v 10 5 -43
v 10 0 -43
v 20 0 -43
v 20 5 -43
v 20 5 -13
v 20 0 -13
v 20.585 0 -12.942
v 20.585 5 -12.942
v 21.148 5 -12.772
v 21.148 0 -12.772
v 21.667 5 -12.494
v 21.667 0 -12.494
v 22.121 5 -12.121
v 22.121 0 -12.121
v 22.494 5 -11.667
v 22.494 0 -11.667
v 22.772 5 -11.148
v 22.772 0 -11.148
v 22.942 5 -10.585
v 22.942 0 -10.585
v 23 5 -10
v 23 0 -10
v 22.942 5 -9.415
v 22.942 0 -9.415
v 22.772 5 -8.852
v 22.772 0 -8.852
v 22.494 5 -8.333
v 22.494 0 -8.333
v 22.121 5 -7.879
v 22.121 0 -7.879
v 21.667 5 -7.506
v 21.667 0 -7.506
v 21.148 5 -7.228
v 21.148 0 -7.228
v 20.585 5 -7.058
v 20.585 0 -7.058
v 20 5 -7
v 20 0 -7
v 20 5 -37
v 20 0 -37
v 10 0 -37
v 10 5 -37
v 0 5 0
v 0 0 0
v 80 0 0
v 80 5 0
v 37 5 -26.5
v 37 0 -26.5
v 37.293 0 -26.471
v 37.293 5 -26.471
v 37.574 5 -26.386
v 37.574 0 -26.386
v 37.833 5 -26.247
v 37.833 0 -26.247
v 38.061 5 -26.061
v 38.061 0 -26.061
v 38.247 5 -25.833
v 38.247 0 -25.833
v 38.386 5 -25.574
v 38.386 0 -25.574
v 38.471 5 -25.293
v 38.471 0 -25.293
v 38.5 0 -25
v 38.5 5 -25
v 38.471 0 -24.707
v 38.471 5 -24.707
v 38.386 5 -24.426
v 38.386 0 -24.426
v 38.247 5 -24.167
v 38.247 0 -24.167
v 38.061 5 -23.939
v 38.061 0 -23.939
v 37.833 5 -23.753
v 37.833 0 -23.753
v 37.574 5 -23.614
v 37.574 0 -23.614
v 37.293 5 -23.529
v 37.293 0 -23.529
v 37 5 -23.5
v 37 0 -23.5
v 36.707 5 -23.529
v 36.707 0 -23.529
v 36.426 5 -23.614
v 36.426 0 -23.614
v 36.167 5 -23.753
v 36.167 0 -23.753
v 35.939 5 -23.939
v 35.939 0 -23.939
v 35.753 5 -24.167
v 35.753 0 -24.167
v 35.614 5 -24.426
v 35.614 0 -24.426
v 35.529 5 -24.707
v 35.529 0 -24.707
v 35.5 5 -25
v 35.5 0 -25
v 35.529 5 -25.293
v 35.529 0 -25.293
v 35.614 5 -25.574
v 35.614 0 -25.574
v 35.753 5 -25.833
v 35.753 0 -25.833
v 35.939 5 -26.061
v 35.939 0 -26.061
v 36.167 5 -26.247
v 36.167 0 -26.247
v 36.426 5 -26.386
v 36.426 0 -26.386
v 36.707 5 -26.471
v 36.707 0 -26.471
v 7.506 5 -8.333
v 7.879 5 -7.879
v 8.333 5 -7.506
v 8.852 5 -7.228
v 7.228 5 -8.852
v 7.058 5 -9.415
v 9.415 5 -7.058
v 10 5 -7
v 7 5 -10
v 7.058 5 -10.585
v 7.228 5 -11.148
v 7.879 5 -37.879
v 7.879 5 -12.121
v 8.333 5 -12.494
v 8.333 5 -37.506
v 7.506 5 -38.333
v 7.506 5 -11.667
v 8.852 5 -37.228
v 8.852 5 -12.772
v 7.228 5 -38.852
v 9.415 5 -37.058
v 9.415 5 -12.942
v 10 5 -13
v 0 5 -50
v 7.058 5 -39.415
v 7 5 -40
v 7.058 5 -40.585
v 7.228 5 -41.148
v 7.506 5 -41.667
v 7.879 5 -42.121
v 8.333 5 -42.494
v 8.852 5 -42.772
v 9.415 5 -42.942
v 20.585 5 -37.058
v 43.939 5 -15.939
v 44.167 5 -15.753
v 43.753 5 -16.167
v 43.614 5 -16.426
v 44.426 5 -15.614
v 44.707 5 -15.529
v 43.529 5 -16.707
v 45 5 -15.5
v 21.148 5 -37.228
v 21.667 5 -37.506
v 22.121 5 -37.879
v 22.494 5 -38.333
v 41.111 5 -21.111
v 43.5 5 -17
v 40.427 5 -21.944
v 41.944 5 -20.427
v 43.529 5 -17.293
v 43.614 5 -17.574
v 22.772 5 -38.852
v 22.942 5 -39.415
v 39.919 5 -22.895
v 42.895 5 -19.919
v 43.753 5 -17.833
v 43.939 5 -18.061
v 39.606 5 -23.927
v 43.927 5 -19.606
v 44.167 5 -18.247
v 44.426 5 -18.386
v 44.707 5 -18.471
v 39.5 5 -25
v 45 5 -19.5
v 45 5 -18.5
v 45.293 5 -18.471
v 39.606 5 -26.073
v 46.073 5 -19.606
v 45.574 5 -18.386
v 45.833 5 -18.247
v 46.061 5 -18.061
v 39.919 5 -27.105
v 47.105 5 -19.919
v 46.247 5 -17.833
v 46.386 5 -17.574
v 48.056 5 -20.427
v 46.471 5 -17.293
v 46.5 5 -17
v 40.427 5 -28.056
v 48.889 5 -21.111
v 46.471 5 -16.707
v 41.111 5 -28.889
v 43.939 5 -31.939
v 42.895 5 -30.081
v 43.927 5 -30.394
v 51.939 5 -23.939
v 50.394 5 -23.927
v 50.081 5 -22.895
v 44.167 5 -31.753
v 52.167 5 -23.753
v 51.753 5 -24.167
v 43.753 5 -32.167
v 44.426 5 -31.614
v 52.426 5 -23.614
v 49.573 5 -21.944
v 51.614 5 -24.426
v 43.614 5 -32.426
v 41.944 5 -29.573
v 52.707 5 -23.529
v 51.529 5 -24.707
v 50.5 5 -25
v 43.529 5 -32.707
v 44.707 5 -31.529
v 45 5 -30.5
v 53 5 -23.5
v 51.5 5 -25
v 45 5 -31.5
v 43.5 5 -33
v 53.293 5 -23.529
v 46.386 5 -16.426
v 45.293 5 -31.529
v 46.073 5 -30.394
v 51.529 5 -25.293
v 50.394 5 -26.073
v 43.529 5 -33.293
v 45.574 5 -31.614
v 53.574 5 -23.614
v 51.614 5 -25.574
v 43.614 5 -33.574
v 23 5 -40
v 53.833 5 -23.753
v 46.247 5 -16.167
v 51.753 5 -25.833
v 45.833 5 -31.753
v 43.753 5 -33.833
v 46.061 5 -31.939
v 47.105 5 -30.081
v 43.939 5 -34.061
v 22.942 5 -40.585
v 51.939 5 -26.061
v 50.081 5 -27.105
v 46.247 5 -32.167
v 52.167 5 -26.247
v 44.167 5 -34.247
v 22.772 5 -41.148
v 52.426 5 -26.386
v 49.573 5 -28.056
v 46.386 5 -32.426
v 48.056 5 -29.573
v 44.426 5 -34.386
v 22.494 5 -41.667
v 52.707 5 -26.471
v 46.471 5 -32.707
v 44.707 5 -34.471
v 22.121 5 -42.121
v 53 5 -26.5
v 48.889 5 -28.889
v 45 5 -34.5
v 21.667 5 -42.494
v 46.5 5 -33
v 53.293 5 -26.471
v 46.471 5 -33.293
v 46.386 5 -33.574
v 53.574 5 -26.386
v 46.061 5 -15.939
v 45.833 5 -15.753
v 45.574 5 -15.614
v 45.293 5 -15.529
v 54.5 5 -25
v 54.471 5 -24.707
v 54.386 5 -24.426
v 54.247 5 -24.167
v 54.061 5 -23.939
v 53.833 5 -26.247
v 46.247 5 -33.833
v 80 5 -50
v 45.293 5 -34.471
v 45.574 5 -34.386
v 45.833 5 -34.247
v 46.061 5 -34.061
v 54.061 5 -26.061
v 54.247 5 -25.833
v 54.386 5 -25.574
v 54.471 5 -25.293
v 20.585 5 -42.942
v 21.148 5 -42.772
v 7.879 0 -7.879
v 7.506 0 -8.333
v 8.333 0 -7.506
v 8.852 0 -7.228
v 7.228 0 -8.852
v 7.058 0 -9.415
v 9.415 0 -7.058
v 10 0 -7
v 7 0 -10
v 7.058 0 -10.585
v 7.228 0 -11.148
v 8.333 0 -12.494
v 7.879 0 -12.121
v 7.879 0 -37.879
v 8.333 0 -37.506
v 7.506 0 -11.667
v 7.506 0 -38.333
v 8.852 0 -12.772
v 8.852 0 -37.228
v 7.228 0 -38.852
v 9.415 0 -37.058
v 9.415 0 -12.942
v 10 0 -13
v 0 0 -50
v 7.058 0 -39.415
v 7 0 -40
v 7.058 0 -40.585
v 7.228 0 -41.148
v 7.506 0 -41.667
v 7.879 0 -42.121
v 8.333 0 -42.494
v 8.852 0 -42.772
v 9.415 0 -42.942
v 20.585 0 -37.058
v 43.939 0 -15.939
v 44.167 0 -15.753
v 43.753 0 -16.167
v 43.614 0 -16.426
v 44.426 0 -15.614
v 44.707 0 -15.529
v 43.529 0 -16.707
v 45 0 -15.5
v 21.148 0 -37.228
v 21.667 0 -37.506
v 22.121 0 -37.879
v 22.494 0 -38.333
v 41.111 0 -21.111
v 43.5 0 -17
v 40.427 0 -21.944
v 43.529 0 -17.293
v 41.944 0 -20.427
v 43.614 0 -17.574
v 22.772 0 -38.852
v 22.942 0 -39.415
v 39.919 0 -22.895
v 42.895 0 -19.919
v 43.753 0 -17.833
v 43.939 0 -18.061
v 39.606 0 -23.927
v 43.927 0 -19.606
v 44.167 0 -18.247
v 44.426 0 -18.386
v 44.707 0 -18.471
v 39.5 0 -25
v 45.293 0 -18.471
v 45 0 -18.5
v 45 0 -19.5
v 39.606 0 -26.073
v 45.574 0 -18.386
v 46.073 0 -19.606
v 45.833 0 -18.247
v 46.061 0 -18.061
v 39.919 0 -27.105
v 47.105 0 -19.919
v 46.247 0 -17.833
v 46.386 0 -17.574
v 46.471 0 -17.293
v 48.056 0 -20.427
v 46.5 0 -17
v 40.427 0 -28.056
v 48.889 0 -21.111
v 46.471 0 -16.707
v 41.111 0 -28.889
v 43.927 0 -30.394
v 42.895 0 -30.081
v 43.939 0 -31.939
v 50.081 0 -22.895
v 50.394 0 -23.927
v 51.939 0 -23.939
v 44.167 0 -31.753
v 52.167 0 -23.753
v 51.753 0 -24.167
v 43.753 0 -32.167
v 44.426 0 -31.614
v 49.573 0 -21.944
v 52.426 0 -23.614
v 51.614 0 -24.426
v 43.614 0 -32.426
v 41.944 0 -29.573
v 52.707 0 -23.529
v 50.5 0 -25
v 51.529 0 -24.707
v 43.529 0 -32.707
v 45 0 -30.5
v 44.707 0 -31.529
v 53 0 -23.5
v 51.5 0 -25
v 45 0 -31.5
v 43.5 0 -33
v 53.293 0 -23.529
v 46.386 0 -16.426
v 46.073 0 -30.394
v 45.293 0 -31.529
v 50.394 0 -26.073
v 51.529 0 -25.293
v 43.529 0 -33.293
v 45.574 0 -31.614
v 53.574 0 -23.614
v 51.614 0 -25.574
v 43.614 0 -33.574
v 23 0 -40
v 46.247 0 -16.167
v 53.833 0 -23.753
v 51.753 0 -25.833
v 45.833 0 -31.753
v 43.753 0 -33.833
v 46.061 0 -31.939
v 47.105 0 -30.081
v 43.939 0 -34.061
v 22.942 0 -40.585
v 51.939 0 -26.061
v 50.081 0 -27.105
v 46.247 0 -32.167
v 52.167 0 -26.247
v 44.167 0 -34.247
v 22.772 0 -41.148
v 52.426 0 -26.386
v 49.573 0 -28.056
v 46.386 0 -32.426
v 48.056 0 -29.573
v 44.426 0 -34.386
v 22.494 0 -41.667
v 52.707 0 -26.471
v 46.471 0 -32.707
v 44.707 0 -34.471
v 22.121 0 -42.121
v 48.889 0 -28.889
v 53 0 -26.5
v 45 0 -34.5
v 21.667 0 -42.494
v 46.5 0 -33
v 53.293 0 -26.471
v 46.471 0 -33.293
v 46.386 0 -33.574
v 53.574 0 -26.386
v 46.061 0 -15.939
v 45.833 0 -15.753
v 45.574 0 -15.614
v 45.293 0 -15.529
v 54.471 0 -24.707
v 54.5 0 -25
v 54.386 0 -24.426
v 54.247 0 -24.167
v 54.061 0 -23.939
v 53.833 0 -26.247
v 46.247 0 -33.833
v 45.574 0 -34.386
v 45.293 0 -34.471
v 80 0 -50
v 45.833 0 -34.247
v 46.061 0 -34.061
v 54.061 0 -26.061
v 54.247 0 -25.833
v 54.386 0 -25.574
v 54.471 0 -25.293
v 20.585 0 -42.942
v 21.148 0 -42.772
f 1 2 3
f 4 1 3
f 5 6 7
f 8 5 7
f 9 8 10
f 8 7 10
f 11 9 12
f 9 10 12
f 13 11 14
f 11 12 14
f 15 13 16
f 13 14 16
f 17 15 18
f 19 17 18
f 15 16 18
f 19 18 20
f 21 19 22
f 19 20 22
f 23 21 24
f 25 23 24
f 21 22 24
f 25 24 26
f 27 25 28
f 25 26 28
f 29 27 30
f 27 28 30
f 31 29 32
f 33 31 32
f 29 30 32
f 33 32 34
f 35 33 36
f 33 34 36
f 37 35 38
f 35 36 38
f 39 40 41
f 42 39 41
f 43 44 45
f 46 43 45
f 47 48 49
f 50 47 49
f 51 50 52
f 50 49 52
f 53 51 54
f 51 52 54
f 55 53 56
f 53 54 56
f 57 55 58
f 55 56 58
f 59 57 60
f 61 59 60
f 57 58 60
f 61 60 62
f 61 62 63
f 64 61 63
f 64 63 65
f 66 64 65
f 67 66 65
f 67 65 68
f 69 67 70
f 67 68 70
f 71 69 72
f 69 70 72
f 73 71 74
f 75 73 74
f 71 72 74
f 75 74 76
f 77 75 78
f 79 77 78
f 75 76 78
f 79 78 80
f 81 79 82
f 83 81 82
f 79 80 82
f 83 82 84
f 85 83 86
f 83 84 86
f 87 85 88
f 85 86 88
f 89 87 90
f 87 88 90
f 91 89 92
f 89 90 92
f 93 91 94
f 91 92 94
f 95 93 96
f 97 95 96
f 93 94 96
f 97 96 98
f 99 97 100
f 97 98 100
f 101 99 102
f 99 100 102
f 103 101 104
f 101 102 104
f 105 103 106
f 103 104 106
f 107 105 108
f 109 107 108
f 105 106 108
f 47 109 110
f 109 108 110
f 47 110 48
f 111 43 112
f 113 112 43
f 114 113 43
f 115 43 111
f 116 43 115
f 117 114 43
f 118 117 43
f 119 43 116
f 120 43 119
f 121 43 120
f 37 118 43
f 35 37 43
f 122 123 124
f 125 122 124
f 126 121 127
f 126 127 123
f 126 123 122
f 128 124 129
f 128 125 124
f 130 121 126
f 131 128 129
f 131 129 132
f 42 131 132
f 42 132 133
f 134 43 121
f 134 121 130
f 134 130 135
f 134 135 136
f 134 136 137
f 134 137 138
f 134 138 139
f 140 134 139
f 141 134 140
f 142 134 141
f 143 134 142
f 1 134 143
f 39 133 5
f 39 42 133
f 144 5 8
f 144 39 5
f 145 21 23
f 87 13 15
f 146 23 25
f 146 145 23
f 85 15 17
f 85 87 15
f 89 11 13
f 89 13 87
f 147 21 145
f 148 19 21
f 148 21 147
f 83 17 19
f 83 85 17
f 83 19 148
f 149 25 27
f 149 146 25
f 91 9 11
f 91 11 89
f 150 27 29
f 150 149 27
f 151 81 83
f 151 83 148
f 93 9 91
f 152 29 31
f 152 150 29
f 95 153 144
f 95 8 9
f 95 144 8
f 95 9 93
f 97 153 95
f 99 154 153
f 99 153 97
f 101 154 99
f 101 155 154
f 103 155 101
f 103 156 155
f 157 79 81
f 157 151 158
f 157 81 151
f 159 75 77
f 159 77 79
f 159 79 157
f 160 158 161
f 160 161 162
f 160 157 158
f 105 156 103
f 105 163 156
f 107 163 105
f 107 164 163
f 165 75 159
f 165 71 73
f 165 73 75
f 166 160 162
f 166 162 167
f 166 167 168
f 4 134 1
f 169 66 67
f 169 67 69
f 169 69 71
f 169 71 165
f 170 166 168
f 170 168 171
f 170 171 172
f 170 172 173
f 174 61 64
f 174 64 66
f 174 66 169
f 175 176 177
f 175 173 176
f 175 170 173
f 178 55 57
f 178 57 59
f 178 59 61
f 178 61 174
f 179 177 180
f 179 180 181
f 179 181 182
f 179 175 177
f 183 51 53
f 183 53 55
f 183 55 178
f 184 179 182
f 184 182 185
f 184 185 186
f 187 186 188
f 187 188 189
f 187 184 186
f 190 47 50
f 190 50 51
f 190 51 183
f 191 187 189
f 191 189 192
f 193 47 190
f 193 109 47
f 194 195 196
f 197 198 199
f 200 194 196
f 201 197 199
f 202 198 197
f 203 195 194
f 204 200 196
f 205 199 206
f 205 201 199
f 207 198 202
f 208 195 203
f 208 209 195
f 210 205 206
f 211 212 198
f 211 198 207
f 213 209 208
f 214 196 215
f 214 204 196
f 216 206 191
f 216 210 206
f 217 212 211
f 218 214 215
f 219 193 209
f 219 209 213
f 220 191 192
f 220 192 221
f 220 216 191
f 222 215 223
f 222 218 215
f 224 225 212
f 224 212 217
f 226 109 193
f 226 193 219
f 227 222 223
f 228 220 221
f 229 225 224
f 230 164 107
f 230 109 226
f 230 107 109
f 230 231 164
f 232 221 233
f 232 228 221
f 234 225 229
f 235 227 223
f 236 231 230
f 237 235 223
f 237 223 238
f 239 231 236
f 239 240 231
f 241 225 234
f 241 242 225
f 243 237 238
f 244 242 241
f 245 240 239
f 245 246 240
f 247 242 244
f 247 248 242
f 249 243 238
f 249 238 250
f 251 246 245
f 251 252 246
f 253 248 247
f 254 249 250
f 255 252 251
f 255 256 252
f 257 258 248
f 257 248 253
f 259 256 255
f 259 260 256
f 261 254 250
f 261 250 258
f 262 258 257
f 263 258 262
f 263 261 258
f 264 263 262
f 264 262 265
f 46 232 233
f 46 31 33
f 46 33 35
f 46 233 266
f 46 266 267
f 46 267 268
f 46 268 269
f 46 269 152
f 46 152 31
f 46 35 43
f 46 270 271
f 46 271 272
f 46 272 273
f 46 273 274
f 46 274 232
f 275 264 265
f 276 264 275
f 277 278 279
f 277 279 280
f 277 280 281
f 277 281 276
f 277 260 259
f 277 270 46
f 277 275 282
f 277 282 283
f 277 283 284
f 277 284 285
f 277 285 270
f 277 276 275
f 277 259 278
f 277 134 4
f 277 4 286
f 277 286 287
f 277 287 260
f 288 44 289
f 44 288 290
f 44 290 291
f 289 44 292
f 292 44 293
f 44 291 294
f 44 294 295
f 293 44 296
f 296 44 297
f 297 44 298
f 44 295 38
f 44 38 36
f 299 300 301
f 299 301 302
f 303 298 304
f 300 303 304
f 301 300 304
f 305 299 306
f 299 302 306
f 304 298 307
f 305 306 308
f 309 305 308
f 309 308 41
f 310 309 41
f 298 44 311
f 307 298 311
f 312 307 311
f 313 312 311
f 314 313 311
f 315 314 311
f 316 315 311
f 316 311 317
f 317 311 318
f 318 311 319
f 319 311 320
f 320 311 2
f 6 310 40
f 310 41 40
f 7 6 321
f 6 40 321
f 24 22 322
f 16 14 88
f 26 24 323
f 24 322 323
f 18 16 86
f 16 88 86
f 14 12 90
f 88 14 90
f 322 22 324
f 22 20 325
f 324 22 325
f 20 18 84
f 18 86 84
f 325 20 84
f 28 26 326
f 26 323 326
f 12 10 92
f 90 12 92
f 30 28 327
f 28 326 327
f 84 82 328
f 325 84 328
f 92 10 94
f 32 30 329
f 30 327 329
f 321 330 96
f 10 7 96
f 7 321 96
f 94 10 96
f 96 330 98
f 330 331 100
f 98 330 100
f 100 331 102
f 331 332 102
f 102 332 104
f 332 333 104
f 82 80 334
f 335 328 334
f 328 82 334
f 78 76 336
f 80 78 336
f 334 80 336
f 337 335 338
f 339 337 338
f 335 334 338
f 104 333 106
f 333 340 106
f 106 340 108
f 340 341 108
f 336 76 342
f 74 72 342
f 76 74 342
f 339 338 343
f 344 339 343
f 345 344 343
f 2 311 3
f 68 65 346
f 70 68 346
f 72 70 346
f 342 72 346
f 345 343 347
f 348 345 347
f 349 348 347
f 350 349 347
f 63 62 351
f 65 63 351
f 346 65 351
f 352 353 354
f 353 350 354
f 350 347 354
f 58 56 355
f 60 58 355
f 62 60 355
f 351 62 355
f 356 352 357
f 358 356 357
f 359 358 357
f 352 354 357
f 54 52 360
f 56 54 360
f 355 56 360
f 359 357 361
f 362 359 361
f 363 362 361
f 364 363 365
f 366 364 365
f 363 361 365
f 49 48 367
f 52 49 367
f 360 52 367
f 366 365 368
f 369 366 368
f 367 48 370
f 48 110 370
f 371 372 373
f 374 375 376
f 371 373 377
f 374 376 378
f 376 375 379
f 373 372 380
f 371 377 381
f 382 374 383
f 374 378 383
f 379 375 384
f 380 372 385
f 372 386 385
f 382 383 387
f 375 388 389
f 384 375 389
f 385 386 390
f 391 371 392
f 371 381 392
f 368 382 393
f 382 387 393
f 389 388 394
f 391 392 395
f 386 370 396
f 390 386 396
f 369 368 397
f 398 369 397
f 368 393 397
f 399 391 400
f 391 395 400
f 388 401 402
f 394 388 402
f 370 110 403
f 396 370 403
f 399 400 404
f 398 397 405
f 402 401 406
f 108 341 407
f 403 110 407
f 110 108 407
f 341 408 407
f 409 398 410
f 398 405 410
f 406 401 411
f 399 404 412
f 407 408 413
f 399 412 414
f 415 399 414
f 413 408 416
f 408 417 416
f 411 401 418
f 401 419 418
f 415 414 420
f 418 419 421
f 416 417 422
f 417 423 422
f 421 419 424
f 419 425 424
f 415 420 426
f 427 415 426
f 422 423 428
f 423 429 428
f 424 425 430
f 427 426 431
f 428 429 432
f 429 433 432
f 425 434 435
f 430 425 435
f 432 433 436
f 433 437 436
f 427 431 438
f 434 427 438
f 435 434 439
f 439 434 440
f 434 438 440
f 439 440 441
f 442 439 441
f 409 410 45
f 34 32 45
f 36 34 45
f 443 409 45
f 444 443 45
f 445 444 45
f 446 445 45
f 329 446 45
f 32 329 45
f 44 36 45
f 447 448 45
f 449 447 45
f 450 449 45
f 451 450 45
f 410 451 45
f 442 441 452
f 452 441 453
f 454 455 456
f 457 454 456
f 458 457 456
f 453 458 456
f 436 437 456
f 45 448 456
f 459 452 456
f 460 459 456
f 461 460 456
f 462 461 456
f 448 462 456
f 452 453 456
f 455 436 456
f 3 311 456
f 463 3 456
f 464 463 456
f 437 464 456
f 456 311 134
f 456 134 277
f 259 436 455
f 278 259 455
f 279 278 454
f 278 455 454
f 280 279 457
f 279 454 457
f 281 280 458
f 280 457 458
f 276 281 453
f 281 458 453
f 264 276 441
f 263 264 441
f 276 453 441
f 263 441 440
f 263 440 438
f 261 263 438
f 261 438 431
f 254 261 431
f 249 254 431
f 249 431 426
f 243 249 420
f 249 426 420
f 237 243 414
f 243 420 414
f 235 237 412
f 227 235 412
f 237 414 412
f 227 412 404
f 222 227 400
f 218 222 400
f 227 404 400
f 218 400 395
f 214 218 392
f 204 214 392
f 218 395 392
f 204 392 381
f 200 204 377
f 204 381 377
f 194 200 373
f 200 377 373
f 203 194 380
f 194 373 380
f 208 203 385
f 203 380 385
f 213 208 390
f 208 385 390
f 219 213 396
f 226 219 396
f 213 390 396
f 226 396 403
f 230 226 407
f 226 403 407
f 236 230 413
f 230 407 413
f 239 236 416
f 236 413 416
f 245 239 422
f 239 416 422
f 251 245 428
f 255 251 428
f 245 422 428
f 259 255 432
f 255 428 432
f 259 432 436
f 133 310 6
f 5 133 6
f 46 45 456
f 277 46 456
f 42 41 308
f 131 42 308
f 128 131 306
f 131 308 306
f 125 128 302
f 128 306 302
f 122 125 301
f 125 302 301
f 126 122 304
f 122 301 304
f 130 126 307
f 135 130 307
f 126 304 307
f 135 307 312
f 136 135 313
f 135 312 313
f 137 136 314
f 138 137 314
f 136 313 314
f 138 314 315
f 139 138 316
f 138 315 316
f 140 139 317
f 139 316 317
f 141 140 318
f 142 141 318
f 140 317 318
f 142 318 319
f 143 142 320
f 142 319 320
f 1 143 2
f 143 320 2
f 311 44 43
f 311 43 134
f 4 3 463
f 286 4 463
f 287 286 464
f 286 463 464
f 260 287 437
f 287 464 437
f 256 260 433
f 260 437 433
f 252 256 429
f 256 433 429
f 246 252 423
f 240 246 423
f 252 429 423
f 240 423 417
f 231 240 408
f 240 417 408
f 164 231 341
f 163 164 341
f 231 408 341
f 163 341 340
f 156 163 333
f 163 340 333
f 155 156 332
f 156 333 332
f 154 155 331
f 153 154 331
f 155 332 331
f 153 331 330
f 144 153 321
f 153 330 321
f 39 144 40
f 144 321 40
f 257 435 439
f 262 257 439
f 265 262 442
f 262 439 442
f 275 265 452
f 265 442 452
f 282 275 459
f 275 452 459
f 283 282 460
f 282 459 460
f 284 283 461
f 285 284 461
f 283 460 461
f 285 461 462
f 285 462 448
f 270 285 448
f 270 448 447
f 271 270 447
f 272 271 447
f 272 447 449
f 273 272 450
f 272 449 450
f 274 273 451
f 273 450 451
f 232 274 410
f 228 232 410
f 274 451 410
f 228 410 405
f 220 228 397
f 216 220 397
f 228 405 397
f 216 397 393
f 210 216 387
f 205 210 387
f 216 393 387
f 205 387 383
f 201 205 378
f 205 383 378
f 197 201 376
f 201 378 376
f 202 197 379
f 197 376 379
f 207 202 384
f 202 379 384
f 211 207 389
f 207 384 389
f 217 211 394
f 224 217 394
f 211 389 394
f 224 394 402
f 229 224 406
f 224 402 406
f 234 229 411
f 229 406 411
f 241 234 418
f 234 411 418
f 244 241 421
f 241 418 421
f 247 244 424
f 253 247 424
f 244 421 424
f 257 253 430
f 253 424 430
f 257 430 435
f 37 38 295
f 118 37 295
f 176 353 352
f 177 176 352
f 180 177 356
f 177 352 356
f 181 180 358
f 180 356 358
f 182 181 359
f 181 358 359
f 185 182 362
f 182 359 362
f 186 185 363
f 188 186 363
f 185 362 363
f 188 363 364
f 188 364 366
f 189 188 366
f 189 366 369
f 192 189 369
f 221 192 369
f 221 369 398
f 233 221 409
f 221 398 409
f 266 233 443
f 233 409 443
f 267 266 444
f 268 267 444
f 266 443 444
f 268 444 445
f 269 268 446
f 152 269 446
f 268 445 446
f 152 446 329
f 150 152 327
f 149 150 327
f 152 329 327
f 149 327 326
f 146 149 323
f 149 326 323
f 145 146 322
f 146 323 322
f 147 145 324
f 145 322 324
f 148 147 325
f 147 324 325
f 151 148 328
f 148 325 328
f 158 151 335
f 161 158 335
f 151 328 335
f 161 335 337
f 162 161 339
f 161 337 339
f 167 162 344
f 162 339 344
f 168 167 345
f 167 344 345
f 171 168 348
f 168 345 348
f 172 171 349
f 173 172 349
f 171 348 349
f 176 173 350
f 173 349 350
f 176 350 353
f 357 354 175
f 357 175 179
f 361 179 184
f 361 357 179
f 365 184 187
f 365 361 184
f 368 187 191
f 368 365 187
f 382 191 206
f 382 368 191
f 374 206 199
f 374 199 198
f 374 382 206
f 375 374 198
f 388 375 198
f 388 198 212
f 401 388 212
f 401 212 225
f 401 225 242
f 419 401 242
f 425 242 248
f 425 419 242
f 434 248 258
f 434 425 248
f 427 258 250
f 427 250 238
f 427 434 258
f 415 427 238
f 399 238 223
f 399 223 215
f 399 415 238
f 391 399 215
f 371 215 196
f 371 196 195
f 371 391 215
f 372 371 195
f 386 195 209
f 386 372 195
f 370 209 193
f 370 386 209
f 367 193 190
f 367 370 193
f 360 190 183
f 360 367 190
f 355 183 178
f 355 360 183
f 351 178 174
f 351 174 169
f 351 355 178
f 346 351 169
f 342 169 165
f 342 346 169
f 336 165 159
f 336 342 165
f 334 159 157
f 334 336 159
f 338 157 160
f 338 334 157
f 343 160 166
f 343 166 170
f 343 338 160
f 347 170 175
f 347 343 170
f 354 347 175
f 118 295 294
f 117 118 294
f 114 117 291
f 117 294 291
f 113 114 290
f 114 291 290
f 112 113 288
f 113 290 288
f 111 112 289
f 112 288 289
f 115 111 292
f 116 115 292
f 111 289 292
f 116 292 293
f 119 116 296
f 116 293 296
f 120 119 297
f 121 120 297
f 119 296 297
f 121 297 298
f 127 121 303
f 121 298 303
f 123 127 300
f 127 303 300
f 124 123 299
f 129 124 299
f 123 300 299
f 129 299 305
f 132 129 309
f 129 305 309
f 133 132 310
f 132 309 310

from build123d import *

# Parameters (mm, degrees)
SKETCH1_W           = 80
SKETCH1_H           = 50
SKETCH1_R           = 5.5
BOSS_EXTRUDE1_DEPTH = 5
SKETCH3_R           = 1.5
CUT_EXTRUDE1_DEPTH  = 5


with BuildPart() as part:
    # Sketch1 → Boss-Extrude1 (new body)
    with BuildSketch(Plane(origin=(0, 0, 0), x_dir=(1, 0, 0), z_dir=(0, 1, 0))):
        with Locations((40, 25)):
            Rectangle(SKETCH1_W, SKETCH1_H)
        with Locations(Location((45, 25, 0), (0, 0, 270))):
            Circle(SKETCH1_R, mode=Mode.SUBTRACT)
        with BuildLine():
            Line((10, 43), (20, 43))
            ThreePointArc((20, 43), (23, 40), (20, 37))
            Line((20, 37), (10, 37))
            ThreePointArc((10, 37), (7, 40), (10, 43))
        make_face(mode=Mode.SUBTRACT)
        with BuildLine():
            Line((10, 13), (20, 13))
            ThreePointArc((20, 13), (23, 10), (20, 7))
            Line((20, 7), (10, 7))
            ThreePointArc((10, 7), (7, 10), (10, 13))
        make_face(mode=Mode.SUBTRACT)
    extrude(amount=BOSS_EXTRUDE1_DEPTH)

    # Sketch3 → Cut-Extrude1 (cut)
    with BuildSketch(Plane.XZ):
        with Locations(Location((45, -17, 0), (0, 0, 270))):
            Circle(SKETCH3_R)
        with Locations(Location((53, -25, 0), (0, 0, 270))):
            Circle(SKETCH3_R)
        with Locations(Location((45, -33, 0), (0, 0, 270))):
            Circle(SKETCH3_R)
        with Locations(Location((37, -25, 0), (0, 0, 270))):
            Circle(SKETCH3_R)
    extrude(amount=-CUT_EXTRUDE1_DEPTH, mode=Mode.SUBTRACT)


solid = part.part
